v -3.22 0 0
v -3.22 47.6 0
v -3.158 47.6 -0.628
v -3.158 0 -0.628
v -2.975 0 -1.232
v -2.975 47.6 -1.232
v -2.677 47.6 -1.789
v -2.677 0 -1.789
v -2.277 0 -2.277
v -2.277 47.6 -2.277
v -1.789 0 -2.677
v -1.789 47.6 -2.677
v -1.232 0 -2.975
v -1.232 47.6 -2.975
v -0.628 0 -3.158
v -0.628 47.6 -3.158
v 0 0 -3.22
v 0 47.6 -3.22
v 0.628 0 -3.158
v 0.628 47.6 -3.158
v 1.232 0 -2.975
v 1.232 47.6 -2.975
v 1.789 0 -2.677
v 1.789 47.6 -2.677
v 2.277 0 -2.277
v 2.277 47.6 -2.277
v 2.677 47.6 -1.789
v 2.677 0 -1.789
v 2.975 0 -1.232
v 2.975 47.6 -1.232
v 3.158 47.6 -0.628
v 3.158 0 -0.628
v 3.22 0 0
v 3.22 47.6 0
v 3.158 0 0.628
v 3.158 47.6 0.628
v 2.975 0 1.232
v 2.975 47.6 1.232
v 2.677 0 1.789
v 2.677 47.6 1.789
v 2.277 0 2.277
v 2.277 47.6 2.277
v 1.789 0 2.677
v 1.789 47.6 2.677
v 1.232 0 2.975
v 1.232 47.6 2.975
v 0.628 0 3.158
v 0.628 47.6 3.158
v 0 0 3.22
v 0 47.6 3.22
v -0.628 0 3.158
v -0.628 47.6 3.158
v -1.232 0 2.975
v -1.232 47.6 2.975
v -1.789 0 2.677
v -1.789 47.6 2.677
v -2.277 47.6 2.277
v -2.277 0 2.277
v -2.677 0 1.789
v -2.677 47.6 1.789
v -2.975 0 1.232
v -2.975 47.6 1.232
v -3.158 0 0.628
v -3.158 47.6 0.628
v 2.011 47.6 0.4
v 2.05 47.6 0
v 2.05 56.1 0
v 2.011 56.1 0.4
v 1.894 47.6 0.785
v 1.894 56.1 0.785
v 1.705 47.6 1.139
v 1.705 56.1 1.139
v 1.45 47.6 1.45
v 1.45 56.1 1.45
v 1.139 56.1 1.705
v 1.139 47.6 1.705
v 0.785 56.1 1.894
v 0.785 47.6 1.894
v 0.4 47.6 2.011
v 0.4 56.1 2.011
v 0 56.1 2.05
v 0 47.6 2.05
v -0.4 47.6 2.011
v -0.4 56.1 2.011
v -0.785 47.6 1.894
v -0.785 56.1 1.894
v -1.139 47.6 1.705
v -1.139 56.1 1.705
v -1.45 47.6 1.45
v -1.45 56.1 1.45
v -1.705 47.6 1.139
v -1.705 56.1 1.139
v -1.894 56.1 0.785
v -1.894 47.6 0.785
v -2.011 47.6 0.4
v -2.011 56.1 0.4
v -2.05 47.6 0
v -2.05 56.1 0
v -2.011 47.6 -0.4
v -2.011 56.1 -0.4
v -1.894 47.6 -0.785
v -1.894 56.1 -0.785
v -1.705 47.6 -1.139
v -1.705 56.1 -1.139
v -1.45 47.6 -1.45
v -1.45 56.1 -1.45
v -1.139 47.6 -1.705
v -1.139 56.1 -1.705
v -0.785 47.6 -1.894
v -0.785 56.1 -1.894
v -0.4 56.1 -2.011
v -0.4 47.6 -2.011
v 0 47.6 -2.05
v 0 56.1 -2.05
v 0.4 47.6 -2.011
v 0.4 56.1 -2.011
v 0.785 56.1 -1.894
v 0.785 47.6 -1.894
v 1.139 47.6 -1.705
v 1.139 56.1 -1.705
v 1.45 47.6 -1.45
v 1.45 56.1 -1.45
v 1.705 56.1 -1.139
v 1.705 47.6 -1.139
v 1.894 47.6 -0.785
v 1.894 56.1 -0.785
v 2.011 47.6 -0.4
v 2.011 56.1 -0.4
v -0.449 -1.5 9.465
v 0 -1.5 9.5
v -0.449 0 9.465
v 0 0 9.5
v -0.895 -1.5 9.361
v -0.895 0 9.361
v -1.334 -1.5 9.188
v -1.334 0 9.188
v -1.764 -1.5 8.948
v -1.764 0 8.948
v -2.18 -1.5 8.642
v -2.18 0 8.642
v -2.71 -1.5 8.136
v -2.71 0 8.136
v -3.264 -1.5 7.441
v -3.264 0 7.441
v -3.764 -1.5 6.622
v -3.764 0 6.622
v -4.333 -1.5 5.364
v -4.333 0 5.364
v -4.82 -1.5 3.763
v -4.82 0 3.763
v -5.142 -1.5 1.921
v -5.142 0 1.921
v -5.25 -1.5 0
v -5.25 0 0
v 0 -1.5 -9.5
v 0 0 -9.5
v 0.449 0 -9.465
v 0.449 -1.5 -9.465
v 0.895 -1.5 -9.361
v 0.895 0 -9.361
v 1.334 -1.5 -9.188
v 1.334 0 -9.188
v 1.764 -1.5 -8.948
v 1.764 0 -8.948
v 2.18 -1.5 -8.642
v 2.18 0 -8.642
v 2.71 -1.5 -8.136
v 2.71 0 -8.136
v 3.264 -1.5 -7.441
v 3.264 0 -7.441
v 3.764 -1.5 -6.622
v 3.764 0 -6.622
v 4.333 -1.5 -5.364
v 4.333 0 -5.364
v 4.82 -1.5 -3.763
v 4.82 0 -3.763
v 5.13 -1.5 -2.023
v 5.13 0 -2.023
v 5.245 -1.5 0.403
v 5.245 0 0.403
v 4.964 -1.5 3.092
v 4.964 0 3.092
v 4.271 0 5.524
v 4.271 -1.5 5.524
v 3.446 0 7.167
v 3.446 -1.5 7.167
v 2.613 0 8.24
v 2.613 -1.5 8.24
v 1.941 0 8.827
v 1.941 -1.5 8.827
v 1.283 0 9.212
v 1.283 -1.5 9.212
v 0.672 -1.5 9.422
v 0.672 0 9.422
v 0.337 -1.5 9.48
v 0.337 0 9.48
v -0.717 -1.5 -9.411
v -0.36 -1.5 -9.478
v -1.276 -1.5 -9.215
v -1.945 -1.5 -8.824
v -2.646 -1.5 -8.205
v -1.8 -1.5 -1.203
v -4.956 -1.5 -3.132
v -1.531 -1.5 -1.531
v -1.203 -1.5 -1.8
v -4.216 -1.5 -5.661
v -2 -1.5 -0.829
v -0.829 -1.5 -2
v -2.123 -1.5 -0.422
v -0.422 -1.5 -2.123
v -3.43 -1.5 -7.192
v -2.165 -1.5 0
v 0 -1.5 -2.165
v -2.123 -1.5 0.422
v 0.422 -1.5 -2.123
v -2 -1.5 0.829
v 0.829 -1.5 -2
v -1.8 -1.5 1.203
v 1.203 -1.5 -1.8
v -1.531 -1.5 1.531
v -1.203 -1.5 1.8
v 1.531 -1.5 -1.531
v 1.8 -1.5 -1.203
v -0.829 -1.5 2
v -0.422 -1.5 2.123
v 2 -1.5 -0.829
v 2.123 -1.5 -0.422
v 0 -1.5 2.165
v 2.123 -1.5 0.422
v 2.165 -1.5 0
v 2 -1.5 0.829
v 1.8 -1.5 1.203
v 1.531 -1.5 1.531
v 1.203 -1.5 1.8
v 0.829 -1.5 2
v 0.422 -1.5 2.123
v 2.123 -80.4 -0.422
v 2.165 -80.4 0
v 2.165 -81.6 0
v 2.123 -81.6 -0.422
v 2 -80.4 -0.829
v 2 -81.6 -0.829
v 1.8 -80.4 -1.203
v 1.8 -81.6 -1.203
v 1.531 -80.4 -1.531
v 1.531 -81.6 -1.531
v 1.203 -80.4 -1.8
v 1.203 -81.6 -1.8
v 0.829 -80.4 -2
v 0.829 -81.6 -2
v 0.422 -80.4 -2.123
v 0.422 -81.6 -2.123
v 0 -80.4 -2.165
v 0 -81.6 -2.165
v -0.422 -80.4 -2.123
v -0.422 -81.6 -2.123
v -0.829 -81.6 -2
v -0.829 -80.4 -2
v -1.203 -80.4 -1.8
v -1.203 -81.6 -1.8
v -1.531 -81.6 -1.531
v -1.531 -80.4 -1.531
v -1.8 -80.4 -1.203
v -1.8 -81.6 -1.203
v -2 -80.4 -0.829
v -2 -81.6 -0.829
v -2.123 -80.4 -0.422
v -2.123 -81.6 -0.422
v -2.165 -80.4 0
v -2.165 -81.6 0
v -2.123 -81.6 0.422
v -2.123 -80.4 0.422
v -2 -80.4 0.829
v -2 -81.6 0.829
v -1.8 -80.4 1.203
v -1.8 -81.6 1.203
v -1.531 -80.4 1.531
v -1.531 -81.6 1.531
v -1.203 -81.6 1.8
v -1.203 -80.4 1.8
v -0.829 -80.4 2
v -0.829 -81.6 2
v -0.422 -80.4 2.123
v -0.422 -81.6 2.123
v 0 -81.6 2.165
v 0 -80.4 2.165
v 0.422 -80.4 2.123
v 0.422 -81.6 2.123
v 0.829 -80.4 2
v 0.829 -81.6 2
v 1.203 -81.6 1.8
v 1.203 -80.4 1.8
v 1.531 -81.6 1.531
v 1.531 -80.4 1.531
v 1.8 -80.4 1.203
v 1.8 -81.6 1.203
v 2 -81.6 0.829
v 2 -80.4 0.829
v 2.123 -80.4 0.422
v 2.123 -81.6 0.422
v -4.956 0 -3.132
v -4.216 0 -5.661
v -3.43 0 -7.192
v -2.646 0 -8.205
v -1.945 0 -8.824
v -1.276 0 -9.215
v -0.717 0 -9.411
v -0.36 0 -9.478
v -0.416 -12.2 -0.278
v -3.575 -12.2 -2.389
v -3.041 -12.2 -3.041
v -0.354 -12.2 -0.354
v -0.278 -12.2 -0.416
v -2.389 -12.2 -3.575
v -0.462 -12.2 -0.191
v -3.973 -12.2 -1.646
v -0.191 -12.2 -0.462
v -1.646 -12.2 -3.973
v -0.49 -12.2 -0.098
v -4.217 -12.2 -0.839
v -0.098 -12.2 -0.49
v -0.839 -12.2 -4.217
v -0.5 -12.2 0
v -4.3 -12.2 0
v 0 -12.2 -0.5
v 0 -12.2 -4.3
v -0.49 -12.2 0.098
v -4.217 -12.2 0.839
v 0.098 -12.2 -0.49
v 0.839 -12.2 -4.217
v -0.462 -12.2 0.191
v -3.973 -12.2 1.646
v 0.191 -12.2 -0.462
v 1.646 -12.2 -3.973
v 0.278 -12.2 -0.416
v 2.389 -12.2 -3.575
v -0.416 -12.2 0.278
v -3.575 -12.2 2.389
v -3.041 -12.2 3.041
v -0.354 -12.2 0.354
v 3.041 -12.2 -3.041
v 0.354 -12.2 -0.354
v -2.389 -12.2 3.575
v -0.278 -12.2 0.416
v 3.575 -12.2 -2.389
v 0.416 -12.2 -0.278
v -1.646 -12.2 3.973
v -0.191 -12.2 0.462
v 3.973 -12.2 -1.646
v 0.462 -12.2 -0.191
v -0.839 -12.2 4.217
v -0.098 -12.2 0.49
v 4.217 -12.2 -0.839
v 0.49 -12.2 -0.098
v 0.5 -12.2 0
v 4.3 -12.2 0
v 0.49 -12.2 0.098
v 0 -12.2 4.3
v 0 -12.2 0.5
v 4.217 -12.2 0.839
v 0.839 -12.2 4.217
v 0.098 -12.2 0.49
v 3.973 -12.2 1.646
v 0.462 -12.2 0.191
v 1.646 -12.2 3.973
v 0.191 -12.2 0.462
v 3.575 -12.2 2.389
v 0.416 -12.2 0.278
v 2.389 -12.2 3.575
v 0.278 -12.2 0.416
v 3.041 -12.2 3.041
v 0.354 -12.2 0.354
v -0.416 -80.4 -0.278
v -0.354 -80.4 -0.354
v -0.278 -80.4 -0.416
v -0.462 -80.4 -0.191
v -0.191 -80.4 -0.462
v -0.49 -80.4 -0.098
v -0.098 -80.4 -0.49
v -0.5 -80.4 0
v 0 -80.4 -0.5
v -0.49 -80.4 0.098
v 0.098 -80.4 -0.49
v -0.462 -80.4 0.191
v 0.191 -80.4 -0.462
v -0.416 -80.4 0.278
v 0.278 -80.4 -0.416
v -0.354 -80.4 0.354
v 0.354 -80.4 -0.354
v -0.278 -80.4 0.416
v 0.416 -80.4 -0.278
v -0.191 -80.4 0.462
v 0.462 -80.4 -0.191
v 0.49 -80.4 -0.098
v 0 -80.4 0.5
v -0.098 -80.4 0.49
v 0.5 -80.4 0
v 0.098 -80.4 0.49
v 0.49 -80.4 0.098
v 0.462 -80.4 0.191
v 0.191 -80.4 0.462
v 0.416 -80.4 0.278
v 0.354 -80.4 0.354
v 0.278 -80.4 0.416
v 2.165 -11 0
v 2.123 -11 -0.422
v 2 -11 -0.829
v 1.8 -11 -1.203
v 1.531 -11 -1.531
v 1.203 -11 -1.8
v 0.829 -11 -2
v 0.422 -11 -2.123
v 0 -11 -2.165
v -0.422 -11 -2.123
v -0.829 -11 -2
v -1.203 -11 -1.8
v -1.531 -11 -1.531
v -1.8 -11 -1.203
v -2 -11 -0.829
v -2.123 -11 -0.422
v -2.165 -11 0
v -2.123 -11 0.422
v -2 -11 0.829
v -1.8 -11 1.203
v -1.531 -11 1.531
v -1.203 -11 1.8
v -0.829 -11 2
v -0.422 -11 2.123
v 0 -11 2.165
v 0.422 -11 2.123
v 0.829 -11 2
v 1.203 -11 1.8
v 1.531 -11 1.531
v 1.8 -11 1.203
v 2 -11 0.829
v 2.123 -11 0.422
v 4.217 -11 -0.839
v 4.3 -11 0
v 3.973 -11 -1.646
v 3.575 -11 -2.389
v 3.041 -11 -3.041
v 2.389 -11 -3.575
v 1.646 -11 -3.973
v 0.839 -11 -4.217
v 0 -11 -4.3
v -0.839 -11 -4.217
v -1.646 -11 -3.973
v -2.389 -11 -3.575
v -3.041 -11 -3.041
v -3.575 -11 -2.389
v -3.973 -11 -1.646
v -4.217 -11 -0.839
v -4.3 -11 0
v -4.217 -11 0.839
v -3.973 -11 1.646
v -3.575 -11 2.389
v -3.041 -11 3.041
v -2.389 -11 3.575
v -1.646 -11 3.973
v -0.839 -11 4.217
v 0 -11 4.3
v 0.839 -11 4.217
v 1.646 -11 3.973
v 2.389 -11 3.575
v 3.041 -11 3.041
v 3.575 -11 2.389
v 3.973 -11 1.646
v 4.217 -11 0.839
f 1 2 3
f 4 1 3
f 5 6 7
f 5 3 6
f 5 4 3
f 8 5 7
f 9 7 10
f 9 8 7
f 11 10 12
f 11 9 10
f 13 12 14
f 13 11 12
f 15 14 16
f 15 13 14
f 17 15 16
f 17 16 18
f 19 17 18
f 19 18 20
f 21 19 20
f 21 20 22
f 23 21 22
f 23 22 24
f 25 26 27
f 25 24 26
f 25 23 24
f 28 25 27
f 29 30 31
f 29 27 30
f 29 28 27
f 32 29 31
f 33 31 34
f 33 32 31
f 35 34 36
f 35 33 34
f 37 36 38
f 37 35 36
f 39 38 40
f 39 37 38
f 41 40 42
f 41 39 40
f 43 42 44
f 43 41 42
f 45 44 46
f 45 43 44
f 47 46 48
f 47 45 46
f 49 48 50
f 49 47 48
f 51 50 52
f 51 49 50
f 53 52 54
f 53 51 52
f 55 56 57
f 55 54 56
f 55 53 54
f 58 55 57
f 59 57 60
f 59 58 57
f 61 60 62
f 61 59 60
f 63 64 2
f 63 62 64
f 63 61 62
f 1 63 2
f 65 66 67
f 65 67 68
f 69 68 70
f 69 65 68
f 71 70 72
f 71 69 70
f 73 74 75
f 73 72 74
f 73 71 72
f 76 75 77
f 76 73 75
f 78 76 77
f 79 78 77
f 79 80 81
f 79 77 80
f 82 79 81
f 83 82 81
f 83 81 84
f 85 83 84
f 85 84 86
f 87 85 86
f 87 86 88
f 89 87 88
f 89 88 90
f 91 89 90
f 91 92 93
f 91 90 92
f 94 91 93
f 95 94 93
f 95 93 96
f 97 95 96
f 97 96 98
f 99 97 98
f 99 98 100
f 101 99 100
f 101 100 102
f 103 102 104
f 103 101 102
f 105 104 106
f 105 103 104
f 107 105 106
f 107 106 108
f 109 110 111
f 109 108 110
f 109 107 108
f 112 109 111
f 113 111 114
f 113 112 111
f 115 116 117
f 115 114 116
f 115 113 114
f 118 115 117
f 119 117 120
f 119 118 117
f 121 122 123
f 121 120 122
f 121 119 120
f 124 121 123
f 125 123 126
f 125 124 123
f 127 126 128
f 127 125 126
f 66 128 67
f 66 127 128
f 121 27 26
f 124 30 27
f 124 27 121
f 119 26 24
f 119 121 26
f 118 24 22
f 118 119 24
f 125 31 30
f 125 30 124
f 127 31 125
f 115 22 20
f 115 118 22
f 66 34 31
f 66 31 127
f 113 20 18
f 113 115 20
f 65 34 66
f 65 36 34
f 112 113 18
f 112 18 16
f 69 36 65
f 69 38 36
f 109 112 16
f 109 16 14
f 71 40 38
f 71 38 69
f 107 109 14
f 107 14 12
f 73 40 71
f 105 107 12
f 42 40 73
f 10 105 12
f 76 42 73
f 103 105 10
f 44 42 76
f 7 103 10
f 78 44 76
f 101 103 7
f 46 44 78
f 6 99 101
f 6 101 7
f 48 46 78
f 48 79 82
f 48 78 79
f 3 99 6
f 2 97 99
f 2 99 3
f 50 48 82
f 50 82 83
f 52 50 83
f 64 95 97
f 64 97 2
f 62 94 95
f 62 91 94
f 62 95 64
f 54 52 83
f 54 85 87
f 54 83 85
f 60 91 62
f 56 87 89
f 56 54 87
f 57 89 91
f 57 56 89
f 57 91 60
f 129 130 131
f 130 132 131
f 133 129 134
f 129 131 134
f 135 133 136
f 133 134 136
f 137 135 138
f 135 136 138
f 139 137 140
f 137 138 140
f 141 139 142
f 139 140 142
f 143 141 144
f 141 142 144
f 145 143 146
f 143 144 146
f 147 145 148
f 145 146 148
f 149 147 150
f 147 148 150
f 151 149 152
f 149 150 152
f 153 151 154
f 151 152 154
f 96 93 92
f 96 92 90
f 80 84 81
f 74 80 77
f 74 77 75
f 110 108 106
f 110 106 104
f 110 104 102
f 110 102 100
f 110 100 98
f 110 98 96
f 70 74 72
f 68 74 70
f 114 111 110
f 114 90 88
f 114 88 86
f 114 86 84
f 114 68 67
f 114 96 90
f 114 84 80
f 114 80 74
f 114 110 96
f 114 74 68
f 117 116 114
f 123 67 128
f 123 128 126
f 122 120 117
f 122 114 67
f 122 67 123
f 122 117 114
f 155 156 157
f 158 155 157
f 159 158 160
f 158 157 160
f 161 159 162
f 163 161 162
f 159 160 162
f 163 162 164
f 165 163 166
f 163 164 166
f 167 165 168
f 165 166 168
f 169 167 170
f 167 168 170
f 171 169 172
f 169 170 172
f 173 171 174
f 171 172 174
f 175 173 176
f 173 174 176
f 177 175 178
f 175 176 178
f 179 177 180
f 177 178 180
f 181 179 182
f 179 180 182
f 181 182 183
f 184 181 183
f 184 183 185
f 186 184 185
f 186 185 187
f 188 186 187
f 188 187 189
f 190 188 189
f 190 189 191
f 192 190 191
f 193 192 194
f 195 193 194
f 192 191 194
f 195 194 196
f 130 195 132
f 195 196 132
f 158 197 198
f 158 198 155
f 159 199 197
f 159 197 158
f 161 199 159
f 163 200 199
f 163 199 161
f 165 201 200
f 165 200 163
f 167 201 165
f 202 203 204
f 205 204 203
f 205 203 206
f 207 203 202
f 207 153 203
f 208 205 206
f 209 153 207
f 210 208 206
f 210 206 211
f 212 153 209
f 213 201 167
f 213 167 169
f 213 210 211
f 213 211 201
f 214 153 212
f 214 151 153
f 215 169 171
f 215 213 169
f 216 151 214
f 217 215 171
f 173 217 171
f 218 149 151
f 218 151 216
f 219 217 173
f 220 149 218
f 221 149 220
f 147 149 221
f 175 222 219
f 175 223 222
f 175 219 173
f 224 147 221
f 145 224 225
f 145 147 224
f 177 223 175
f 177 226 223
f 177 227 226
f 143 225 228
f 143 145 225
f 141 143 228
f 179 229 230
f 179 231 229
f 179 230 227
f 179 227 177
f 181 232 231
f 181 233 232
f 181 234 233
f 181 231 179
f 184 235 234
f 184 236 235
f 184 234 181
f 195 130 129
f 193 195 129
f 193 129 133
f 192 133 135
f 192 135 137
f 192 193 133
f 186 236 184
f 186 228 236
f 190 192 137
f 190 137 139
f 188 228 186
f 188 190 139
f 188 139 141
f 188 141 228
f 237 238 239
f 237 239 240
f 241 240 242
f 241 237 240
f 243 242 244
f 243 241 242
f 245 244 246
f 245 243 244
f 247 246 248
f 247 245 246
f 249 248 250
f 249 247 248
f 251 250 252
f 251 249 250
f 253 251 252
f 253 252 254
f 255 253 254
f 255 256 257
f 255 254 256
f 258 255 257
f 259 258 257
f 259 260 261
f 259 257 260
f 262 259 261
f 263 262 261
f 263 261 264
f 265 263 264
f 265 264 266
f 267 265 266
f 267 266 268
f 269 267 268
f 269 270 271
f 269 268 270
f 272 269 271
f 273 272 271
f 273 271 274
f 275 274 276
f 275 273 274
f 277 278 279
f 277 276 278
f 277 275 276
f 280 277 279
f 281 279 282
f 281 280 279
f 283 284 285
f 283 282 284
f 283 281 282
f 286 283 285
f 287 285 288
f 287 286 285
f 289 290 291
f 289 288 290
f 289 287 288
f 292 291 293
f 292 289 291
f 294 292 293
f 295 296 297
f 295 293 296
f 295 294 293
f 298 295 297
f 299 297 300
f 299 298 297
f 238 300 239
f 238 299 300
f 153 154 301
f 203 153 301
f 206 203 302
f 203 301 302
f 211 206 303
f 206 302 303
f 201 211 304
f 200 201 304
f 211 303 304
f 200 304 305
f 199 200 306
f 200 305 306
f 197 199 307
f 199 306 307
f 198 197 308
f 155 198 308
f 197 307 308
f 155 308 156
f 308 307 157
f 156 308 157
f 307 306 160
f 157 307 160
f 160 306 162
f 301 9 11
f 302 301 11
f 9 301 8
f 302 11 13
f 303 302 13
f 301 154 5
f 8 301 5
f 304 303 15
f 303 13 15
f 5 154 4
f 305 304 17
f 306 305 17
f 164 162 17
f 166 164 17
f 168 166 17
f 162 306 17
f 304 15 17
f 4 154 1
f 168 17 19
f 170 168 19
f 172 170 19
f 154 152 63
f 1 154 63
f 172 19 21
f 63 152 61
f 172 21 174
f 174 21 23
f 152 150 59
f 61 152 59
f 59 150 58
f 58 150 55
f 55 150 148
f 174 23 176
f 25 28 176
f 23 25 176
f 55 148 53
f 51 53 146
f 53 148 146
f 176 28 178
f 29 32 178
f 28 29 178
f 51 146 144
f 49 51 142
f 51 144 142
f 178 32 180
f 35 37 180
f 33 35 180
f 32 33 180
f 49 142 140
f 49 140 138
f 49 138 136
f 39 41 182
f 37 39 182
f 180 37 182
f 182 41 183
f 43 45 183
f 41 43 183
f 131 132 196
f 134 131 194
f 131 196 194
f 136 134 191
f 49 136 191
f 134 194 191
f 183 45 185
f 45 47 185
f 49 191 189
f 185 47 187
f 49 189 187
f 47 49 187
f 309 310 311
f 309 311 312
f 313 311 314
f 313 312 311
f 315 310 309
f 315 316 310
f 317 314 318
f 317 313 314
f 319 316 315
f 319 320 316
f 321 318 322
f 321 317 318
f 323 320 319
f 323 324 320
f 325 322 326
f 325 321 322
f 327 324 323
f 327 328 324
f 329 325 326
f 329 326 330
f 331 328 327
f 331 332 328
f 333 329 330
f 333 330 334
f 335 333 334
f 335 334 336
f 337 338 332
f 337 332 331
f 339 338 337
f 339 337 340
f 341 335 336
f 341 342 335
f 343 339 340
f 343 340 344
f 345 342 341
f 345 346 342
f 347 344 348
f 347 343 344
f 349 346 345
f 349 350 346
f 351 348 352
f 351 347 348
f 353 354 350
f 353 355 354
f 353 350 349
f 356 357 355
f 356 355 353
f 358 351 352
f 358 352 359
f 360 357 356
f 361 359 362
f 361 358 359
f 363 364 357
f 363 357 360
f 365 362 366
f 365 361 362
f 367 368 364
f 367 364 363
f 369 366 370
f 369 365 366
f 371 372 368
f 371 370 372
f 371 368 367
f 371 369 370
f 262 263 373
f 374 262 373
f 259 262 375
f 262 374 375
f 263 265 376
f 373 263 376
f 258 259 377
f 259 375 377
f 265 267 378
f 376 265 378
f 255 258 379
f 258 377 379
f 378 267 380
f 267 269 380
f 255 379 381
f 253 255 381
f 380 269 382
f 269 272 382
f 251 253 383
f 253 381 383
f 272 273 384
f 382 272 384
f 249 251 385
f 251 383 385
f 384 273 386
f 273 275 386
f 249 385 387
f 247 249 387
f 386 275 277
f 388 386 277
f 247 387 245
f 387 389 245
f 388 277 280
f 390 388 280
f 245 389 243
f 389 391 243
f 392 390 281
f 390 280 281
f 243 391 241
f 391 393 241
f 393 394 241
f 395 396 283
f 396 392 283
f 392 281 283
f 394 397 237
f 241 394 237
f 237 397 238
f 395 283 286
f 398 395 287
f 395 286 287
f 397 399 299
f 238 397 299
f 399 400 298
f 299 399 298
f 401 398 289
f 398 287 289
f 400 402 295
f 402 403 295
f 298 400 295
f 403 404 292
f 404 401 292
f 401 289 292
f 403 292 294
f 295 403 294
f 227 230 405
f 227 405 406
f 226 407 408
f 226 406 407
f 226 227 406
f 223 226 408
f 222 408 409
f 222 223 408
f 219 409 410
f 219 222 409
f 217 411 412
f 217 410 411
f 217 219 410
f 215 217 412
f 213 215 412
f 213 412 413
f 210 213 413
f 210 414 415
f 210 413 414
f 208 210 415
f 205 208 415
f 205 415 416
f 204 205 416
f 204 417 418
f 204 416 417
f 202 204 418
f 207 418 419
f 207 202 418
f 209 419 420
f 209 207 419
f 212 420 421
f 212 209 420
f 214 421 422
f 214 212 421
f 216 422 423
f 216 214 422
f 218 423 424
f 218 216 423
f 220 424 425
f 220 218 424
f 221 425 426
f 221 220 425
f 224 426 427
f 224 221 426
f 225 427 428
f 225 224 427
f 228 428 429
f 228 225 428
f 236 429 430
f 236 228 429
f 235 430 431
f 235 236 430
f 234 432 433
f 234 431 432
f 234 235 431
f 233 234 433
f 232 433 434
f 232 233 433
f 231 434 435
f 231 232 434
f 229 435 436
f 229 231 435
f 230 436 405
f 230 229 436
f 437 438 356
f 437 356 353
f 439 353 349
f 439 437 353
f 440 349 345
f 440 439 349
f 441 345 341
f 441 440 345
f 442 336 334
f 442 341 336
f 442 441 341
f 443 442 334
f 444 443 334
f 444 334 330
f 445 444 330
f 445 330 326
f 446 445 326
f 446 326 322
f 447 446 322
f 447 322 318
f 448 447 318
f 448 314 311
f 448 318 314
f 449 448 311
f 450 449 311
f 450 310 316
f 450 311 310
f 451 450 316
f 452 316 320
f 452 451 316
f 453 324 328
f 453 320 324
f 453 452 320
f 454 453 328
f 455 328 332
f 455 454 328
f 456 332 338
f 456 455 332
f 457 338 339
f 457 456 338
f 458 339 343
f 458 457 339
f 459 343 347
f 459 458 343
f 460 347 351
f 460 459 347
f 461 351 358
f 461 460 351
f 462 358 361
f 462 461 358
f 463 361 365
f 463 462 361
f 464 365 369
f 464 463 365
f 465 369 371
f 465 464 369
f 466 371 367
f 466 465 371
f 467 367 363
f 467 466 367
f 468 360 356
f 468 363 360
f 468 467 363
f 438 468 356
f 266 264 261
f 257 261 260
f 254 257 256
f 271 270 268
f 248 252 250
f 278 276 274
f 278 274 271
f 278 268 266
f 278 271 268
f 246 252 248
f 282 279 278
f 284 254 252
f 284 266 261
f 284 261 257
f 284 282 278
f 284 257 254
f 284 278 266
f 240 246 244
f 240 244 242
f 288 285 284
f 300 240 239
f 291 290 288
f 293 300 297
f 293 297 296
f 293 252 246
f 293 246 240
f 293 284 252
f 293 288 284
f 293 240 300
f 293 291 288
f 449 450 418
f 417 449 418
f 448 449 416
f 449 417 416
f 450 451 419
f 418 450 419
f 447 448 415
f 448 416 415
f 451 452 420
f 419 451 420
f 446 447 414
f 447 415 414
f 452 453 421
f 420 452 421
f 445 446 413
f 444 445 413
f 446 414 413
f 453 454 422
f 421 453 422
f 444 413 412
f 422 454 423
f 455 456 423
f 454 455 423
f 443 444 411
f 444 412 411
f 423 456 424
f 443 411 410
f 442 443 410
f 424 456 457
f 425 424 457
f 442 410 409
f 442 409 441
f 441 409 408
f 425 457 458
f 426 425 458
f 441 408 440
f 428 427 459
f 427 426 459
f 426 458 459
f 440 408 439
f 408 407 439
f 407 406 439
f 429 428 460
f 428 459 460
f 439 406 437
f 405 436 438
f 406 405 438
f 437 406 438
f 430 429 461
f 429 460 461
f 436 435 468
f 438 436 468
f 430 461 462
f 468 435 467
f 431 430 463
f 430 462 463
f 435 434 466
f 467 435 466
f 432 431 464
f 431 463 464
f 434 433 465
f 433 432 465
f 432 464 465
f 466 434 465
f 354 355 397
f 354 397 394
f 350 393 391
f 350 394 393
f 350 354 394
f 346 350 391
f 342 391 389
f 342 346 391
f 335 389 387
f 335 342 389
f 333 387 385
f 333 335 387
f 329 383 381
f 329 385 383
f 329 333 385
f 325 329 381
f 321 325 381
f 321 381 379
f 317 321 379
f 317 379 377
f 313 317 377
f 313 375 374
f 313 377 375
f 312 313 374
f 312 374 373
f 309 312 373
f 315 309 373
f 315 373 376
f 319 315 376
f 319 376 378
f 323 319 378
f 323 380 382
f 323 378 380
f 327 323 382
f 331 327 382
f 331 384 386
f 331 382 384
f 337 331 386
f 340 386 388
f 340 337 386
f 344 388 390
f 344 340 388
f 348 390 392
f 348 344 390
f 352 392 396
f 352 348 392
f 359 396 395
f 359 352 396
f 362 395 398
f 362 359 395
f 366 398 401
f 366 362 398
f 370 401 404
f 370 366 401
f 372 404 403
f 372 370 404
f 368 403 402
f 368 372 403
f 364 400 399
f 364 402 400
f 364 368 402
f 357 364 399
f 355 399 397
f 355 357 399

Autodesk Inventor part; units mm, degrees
ref_plane "YZ Plane" through (0, 0, 0) normal (1, 0, 0) x (0, 1, 0)
ref_plane "XZ Plane" through (0, 0, 0) normal (0, 1, 0) x (-1, 0, 0)
ref_plane "XY Plane" through (0, 0, 0) normal (0, 0, 1) x (1, 0, 0)
sketch "Skizze1" plane through (0, 0, 0) normal (0, 1, 0) x (-1, 0, 0)
  circle A0 centre (0, 0) radius 3.22
  dimension "d0" = 6.44
extrude "Extrusion1" add sketch "Skizze1" along normal blind 47.6
sketch "Skizze2" plane through (0, 47.6, 0) normal (0, 1, 0) x (1, 0, 0)
  circle A0 centre (0, 0) radius 3.22 projected
  circle A1 centre (0, 0) radius 3.22 projected
  circle A2 centre (0, 0) radius 2.05
  dimension "d3" = 4.1
extrude "Extrusion2" add sketch "Skizze2" along normal blind 8.5 contours A2
sketch "Skizze3" plane through (0, 0, 0) normal (0, -1, 0) x (1, 0, 0)
  circle A0 centre (0, 0) radius 3.22 projected
  ellipse E0 centre (0, 0) end of major axis (0, -9.5) minor radius 5.25
  line L0 (0, 9.5) -> (0, 0)
  line L1 (0, -10.6353) -> (0, 10.6353) projected
  line L2 (0, 0) -> (-5.25, 0)
  dimension "d6" = 9.5
  dimension "d7" = 5.25
extrude "Extrusion3" add sketch "Skizze3" along normal blind 1.5
sketch "Skizze4" plane through (0, -1.5, 0) normal (0, -1, 0) x (1, 0, 0)
  circle A0 centre (0, 0) radius 3.22 projected
  circle A1 centre (0, 0) radius 2.165
  dimension "d10" = 4.33
extrude "Extrusion4" add sketch "Skizze4" along normal blind 9.5 contours A1
sketch "Skizze5" plane through (0, -11, 0) normal (0, -1, 0) x (1, 0, 0)
  circle A0 centre (0, 0) radius 2.165 projected
  circle A1 centre (0, 0) radius 4.3
  dimension "d13" = 8.6
extrude "Extrusion5" add sketch "Skizze5" along normal blind 1.2 contours A0 | A1
sketch "Skizze6" plane through (0, -12.2, 0) normal (0, -1, 0) x (1, 0, 0)
  ellipse E0 centre (0, 0) end of major axis (0, -9.5) minor radius 5.25 projected
  circle A0 centre (0, 0) radius 0.5
  dimension "d16" = 1
extrude "Extrusion6" add sketch "Skizze6" along normal blind 68.2 contours A0
sketch "Skizze7" plane through (0, -80.4, 0) normal (0, -1, 0) x (1, 0, 0)
  circle A0 centre (0, 0) radius 2.165 projected
extrude "Extrusion7" add sketch "Skizze7" along normal blind 1.2
properties part number "00_Syringe_10ml"
